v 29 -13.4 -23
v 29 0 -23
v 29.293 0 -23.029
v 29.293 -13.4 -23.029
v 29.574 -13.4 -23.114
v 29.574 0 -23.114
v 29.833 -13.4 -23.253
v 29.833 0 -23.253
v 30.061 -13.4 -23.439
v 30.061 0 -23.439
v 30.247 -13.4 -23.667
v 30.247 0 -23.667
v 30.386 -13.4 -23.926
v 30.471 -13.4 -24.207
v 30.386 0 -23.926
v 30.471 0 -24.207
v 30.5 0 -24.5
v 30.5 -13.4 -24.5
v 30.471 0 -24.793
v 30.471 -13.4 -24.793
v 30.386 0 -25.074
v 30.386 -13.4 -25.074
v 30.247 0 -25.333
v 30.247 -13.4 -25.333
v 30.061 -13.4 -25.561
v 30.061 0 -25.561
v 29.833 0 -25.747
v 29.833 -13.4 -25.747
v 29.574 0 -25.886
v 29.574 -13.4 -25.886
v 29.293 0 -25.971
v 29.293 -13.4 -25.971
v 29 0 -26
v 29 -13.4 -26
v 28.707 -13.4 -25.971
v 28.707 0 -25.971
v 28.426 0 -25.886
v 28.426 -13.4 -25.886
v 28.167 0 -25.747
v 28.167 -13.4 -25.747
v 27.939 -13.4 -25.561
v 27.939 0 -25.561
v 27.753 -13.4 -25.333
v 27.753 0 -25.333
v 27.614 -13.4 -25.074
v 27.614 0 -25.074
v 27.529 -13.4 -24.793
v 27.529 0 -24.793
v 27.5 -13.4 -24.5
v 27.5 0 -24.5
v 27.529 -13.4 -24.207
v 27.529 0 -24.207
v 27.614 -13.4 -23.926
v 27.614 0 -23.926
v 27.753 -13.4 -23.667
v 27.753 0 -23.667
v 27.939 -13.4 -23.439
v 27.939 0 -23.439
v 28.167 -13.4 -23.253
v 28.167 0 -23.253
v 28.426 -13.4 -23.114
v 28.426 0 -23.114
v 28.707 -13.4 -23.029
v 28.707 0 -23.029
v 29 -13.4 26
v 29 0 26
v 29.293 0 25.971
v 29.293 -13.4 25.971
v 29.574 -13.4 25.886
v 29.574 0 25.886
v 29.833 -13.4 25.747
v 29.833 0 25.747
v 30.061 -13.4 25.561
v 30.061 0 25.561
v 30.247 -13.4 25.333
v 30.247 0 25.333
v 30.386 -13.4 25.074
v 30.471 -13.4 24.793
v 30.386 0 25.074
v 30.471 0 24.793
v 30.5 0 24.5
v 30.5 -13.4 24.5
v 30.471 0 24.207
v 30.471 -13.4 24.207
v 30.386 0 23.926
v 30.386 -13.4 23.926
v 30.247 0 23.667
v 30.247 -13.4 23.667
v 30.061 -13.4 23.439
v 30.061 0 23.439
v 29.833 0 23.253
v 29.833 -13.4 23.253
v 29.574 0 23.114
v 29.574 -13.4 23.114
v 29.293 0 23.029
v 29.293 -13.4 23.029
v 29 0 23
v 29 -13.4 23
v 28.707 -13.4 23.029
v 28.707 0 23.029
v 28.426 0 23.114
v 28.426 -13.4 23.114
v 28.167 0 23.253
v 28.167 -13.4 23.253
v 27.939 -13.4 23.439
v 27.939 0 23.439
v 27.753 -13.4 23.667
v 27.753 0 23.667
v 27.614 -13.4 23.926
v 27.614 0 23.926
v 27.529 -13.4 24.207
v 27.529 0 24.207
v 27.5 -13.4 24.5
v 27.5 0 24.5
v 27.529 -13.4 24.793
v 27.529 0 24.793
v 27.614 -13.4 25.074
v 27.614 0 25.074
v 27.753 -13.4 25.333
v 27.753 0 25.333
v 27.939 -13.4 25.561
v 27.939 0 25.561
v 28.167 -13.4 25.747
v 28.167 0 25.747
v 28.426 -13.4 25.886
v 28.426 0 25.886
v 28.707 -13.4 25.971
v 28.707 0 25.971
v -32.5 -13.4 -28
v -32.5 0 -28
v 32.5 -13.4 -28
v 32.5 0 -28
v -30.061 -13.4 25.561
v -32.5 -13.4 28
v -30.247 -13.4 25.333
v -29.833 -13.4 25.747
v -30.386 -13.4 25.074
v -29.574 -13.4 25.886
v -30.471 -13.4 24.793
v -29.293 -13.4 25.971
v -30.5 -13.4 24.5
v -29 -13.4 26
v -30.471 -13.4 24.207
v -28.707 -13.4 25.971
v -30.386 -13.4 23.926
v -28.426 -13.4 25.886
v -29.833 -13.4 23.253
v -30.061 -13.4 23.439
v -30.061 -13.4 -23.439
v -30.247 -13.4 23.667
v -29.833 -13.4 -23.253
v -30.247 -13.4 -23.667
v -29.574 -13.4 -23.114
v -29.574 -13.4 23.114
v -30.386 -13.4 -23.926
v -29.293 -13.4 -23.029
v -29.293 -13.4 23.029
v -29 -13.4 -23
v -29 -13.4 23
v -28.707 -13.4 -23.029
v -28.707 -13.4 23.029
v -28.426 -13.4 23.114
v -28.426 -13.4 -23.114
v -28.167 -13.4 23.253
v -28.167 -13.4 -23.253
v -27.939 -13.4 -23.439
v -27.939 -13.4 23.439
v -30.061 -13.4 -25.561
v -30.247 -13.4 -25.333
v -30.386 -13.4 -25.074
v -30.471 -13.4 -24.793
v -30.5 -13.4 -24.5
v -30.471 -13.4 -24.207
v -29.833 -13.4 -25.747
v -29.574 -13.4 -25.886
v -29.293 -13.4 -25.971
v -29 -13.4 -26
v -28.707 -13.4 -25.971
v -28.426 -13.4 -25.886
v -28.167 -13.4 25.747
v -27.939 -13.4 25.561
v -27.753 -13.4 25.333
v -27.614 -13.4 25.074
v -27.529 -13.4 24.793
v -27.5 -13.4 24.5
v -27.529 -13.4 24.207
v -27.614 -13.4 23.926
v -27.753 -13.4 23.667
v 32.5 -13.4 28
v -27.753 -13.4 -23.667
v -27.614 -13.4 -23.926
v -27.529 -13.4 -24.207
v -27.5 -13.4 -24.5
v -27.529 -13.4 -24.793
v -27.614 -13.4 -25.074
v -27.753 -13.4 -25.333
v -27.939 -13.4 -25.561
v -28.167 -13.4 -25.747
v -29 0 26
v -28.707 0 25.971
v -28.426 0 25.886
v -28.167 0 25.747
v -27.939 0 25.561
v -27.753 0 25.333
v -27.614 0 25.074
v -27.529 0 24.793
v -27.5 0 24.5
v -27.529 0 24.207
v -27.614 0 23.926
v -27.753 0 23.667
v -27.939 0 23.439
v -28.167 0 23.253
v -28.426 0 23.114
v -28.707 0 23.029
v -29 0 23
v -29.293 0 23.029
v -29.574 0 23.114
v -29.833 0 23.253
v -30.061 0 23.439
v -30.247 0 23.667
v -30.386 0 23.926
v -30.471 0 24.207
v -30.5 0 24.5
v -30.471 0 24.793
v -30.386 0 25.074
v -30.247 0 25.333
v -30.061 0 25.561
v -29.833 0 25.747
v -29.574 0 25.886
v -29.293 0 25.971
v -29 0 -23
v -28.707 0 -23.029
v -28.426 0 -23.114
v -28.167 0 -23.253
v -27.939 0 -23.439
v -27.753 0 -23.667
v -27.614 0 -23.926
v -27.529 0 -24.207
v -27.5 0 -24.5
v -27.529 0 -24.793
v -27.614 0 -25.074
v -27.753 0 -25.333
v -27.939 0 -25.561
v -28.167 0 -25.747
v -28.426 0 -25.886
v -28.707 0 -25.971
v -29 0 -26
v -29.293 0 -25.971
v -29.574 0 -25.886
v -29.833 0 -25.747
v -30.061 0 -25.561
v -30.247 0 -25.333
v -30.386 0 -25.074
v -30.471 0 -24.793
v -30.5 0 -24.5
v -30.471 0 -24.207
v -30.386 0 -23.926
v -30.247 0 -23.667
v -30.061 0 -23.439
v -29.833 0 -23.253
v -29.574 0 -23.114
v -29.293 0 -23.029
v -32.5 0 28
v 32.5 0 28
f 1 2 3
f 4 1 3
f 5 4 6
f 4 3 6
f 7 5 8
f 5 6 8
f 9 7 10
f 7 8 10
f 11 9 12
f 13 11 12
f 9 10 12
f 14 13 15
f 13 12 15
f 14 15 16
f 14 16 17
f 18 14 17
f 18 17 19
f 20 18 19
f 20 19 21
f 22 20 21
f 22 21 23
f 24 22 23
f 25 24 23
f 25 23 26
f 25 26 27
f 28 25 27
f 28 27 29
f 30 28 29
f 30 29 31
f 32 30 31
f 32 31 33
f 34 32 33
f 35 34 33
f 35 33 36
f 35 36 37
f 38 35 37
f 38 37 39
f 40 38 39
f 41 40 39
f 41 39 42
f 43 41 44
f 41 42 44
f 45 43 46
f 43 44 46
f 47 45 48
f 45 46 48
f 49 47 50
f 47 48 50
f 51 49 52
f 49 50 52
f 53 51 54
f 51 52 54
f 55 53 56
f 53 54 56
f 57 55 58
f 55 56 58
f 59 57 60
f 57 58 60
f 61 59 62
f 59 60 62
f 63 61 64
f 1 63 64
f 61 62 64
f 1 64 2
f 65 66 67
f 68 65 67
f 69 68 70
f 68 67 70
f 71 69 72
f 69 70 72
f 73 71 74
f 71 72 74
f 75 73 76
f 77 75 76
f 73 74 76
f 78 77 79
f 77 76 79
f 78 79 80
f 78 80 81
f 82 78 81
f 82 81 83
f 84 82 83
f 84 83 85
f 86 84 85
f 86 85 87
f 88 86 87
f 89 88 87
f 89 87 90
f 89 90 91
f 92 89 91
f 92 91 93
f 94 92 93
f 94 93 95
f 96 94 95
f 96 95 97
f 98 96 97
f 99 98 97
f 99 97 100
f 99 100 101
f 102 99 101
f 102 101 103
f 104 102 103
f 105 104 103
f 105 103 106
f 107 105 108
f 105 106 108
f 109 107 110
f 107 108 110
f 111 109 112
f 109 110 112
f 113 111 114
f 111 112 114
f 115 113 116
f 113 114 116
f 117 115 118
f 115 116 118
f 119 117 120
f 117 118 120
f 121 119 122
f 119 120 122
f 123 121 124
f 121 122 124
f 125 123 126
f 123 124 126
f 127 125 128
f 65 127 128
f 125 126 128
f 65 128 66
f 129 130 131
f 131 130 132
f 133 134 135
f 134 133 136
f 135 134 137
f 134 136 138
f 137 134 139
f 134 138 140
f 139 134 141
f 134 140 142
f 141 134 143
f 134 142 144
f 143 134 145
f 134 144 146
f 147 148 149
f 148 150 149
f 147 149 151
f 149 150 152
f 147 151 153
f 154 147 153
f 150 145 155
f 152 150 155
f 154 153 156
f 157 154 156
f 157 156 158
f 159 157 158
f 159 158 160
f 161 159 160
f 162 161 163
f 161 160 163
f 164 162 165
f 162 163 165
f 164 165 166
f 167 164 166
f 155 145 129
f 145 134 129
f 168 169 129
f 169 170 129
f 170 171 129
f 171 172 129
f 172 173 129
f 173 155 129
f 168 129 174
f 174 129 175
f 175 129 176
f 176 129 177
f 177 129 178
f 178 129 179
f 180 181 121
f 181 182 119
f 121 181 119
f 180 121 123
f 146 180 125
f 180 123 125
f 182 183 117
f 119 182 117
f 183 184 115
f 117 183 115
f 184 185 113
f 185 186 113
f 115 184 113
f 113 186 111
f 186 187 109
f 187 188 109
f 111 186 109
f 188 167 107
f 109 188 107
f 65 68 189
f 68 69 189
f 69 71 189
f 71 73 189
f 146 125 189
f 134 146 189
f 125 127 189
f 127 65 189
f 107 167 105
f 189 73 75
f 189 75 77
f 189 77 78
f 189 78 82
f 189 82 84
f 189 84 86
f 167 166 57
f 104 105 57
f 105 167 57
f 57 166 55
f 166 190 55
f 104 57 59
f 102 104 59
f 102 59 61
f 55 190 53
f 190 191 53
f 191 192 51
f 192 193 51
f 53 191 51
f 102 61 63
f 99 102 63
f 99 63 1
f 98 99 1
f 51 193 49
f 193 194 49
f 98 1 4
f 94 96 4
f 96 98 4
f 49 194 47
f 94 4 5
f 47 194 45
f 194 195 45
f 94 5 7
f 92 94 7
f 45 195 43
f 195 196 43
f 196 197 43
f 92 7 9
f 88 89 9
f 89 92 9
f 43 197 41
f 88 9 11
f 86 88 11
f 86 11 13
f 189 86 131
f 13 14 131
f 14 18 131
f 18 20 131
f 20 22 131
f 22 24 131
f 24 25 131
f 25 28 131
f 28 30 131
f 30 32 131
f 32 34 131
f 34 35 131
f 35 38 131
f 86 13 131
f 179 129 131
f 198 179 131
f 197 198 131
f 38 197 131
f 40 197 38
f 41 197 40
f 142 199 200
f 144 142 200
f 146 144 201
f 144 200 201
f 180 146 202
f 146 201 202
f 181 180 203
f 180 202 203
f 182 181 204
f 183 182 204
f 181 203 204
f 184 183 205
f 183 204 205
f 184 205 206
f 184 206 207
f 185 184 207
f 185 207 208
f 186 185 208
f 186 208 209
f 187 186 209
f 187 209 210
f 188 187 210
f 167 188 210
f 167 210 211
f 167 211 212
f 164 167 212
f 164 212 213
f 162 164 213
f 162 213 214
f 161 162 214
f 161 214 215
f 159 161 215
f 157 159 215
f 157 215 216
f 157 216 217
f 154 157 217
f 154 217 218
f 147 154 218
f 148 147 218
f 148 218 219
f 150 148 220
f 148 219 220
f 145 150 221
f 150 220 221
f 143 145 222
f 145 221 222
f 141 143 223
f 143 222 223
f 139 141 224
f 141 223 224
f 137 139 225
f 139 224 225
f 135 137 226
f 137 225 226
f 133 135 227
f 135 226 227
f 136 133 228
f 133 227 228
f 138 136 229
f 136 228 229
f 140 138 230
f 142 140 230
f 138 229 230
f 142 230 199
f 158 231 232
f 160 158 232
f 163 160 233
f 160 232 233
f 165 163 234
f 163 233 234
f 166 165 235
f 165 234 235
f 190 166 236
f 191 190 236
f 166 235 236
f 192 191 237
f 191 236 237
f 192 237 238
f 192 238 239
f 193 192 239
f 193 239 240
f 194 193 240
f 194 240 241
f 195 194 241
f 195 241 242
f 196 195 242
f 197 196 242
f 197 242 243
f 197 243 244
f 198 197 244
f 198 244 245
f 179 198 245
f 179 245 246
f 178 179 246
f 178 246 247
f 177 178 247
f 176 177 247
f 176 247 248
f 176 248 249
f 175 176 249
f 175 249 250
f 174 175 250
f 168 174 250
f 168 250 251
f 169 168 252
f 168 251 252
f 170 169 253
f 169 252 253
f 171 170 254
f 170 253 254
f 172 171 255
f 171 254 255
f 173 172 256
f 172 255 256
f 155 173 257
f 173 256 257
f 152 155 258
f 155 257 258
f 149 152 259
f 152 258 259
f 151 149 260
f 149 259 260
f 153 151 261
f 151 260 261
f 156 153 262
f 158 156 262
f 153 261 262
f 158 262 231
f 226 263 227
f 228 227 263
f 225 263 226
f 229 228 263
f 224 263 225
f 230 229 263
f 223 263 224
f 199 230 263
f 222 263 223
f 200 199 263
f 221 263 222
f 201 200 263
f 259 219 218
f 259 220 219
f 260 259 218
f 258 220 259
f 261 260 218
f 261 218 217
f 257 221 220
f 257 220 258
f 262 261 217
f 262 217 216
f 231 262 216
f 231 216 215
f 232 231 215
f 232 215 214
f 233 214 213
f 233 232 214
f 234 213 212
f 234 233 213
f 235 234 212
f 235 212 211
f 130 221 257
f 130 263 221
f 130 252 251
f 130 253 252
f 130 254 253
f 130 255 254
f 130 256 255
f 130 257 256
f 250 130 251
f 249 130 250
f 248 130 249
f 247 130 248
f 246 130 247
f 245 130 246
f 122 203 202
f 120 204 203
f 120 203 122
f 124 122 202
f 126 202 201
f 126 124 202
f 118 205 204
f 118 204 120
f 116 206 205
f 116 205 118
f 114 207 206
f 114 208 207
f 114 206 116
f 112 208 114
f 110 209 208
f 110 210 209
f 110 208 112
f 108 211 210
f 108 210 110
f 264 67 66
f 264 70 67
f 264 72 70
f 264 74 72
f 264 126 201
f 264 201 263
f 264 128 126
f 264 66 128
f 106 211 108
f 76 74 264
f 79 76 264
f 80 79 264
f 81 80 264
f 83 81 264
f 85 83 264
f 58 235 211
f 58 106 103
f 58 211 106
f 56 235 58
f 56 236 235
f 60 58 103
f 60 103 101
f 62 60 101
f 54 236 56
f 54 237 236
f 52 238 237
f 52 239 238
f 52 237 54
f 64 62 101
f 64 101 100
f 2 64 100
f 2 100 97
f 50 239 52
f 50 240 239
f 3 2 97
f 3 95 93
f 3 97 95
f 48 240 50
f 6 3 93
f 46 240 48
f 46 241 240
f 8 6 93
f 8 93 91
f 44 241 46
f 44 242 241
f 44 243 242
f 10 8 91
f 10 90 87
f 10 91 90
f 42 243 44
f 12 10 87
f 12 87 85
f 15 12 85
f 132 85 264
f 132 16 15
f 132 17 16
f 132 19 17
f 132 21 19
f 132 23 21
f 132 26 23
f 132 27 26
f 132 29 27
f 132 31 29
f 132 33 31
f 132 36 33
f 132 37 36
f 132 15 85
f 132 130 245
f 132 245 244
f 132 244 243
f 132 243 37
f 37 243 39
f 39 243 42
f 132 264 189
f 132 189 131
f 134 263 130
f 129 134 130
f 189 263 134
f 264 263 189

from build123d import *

# Parameters (mm, degrees)
SKETCH1_W           = 65
SKETCH1_H           = 56
BOSS_EXTRUDE1_DEPTH = 13.4
CUT_EXTRUDE1_REACH  = 46.942
SKETCH2_R           = 1.5


with BuildPart() as part:
    # Sketch1 → Boss-Extrude1 (new body)
    with BuildSketch(Plane(origin=(0, 0, 0), x_dir=(1, 0, 0), z_dir=(0, 1, 0))):
        Rectangle(SKETCH1_W, SKETCH1_H)
    extrude(amount=-BOSS_EXTRUDE1_DEPTH)

    # Sketch2 → Cut-Extrude1 (cut, up to next)
    with BuildSketch(Plane(origin=(0, 0, 0), x_dir=(1, 0, 0), z_dir=(0, 1, 0)), mode=Mode.PRIVATE) as cut_extrude1_sk1:
        with Locations(Location((29, 24.5, 0), (0, 0, 270))):
            Circle(SKETCH2_R)
    cut_extrude1_tool1 = extrude(cut_extrude1_sk1.sketch, amount=-CUT_EXTRUDE1_REACH, mode=Mode.PRIVATE) & part.part
    # Sketch2 → Cut-Extrude1 (cut, up to next)
    with BuildSketch(Plane(origin=(0, 0, 0), x_dir=(1, 0, 0), z_dir=(0, 1, 0)), mode=Mode.PRIVATE) as cut_extrude1_sk2:
        with Locations(Location((29, -24.5, 0), (0, 0, 270))):
            Circle(SKETCH2_R)
    cut_extrude1_tool2 = extrude(cut_extrude1_sk2.sketch, amount=-CUT_EXTRUDE1_REACH, mode=Mode.PRIVATE) & part.part
    # Sketch2 → Cut-Extrude1 (cut, up to next)
    with BuildSketch(Plane(origin=(0, 0, 0), x_dir=(1, 0, 0), z_dir=(0, 1, 0)), mode=Mode.PRIVATE) as cut_extrude1_sk3:
        with Locations(Location((-29, -24.5, 0), (0, 0, 270))):
            Circle(SKETCH2_R)
    cut_extrude1_tool3 = extrude(cut_extrude1_sk3.sketch, amount=-CUT_EXTRUDE1_REACH, mode=Mode.PRIVATE) & part.part
    # Sketch2 → Cut-Extrude1 (cut, up to next)
    with BuildSketch(Plane(origin=(0, 0, 0), x_dir=(1, 0, 0), z_dir=(0, 1, 0)), mode=Mode.PRIVATE) as cut_extrude1_sk4:
        with Locations(Location((-29, 24.5, 0), (0, 0, 270))):
            Circle(SKETCH2_R)
    cut_extrude1_tool4 = extrude(cut_extrude1_sk4.sketch, amount=-CUT_EXTRUDE1_REACH, mode=Mode.PRIVATE) & part.part
    add(cut_extrude1_tool1.solids().sort_by_distance((29, 0, -24.5))[0], mode=Mode.SUBTRACT)
    add(cut_extrude1_tool2.solids().sort_by_distance((29, 0, 24.5))[0], mode=Mode.SUBTRACT)
    add(cut_extrude1_tool3.solids().sort_by_distance((-29, 0, 24.5))[0], mode=Mode.SUBTRACT)
    add(cut_extrude1_tool4.solids().sort_by_distance((-29, 0, -24.5))[0], mode=Mode.SUBTRACT)


solid = part.part
